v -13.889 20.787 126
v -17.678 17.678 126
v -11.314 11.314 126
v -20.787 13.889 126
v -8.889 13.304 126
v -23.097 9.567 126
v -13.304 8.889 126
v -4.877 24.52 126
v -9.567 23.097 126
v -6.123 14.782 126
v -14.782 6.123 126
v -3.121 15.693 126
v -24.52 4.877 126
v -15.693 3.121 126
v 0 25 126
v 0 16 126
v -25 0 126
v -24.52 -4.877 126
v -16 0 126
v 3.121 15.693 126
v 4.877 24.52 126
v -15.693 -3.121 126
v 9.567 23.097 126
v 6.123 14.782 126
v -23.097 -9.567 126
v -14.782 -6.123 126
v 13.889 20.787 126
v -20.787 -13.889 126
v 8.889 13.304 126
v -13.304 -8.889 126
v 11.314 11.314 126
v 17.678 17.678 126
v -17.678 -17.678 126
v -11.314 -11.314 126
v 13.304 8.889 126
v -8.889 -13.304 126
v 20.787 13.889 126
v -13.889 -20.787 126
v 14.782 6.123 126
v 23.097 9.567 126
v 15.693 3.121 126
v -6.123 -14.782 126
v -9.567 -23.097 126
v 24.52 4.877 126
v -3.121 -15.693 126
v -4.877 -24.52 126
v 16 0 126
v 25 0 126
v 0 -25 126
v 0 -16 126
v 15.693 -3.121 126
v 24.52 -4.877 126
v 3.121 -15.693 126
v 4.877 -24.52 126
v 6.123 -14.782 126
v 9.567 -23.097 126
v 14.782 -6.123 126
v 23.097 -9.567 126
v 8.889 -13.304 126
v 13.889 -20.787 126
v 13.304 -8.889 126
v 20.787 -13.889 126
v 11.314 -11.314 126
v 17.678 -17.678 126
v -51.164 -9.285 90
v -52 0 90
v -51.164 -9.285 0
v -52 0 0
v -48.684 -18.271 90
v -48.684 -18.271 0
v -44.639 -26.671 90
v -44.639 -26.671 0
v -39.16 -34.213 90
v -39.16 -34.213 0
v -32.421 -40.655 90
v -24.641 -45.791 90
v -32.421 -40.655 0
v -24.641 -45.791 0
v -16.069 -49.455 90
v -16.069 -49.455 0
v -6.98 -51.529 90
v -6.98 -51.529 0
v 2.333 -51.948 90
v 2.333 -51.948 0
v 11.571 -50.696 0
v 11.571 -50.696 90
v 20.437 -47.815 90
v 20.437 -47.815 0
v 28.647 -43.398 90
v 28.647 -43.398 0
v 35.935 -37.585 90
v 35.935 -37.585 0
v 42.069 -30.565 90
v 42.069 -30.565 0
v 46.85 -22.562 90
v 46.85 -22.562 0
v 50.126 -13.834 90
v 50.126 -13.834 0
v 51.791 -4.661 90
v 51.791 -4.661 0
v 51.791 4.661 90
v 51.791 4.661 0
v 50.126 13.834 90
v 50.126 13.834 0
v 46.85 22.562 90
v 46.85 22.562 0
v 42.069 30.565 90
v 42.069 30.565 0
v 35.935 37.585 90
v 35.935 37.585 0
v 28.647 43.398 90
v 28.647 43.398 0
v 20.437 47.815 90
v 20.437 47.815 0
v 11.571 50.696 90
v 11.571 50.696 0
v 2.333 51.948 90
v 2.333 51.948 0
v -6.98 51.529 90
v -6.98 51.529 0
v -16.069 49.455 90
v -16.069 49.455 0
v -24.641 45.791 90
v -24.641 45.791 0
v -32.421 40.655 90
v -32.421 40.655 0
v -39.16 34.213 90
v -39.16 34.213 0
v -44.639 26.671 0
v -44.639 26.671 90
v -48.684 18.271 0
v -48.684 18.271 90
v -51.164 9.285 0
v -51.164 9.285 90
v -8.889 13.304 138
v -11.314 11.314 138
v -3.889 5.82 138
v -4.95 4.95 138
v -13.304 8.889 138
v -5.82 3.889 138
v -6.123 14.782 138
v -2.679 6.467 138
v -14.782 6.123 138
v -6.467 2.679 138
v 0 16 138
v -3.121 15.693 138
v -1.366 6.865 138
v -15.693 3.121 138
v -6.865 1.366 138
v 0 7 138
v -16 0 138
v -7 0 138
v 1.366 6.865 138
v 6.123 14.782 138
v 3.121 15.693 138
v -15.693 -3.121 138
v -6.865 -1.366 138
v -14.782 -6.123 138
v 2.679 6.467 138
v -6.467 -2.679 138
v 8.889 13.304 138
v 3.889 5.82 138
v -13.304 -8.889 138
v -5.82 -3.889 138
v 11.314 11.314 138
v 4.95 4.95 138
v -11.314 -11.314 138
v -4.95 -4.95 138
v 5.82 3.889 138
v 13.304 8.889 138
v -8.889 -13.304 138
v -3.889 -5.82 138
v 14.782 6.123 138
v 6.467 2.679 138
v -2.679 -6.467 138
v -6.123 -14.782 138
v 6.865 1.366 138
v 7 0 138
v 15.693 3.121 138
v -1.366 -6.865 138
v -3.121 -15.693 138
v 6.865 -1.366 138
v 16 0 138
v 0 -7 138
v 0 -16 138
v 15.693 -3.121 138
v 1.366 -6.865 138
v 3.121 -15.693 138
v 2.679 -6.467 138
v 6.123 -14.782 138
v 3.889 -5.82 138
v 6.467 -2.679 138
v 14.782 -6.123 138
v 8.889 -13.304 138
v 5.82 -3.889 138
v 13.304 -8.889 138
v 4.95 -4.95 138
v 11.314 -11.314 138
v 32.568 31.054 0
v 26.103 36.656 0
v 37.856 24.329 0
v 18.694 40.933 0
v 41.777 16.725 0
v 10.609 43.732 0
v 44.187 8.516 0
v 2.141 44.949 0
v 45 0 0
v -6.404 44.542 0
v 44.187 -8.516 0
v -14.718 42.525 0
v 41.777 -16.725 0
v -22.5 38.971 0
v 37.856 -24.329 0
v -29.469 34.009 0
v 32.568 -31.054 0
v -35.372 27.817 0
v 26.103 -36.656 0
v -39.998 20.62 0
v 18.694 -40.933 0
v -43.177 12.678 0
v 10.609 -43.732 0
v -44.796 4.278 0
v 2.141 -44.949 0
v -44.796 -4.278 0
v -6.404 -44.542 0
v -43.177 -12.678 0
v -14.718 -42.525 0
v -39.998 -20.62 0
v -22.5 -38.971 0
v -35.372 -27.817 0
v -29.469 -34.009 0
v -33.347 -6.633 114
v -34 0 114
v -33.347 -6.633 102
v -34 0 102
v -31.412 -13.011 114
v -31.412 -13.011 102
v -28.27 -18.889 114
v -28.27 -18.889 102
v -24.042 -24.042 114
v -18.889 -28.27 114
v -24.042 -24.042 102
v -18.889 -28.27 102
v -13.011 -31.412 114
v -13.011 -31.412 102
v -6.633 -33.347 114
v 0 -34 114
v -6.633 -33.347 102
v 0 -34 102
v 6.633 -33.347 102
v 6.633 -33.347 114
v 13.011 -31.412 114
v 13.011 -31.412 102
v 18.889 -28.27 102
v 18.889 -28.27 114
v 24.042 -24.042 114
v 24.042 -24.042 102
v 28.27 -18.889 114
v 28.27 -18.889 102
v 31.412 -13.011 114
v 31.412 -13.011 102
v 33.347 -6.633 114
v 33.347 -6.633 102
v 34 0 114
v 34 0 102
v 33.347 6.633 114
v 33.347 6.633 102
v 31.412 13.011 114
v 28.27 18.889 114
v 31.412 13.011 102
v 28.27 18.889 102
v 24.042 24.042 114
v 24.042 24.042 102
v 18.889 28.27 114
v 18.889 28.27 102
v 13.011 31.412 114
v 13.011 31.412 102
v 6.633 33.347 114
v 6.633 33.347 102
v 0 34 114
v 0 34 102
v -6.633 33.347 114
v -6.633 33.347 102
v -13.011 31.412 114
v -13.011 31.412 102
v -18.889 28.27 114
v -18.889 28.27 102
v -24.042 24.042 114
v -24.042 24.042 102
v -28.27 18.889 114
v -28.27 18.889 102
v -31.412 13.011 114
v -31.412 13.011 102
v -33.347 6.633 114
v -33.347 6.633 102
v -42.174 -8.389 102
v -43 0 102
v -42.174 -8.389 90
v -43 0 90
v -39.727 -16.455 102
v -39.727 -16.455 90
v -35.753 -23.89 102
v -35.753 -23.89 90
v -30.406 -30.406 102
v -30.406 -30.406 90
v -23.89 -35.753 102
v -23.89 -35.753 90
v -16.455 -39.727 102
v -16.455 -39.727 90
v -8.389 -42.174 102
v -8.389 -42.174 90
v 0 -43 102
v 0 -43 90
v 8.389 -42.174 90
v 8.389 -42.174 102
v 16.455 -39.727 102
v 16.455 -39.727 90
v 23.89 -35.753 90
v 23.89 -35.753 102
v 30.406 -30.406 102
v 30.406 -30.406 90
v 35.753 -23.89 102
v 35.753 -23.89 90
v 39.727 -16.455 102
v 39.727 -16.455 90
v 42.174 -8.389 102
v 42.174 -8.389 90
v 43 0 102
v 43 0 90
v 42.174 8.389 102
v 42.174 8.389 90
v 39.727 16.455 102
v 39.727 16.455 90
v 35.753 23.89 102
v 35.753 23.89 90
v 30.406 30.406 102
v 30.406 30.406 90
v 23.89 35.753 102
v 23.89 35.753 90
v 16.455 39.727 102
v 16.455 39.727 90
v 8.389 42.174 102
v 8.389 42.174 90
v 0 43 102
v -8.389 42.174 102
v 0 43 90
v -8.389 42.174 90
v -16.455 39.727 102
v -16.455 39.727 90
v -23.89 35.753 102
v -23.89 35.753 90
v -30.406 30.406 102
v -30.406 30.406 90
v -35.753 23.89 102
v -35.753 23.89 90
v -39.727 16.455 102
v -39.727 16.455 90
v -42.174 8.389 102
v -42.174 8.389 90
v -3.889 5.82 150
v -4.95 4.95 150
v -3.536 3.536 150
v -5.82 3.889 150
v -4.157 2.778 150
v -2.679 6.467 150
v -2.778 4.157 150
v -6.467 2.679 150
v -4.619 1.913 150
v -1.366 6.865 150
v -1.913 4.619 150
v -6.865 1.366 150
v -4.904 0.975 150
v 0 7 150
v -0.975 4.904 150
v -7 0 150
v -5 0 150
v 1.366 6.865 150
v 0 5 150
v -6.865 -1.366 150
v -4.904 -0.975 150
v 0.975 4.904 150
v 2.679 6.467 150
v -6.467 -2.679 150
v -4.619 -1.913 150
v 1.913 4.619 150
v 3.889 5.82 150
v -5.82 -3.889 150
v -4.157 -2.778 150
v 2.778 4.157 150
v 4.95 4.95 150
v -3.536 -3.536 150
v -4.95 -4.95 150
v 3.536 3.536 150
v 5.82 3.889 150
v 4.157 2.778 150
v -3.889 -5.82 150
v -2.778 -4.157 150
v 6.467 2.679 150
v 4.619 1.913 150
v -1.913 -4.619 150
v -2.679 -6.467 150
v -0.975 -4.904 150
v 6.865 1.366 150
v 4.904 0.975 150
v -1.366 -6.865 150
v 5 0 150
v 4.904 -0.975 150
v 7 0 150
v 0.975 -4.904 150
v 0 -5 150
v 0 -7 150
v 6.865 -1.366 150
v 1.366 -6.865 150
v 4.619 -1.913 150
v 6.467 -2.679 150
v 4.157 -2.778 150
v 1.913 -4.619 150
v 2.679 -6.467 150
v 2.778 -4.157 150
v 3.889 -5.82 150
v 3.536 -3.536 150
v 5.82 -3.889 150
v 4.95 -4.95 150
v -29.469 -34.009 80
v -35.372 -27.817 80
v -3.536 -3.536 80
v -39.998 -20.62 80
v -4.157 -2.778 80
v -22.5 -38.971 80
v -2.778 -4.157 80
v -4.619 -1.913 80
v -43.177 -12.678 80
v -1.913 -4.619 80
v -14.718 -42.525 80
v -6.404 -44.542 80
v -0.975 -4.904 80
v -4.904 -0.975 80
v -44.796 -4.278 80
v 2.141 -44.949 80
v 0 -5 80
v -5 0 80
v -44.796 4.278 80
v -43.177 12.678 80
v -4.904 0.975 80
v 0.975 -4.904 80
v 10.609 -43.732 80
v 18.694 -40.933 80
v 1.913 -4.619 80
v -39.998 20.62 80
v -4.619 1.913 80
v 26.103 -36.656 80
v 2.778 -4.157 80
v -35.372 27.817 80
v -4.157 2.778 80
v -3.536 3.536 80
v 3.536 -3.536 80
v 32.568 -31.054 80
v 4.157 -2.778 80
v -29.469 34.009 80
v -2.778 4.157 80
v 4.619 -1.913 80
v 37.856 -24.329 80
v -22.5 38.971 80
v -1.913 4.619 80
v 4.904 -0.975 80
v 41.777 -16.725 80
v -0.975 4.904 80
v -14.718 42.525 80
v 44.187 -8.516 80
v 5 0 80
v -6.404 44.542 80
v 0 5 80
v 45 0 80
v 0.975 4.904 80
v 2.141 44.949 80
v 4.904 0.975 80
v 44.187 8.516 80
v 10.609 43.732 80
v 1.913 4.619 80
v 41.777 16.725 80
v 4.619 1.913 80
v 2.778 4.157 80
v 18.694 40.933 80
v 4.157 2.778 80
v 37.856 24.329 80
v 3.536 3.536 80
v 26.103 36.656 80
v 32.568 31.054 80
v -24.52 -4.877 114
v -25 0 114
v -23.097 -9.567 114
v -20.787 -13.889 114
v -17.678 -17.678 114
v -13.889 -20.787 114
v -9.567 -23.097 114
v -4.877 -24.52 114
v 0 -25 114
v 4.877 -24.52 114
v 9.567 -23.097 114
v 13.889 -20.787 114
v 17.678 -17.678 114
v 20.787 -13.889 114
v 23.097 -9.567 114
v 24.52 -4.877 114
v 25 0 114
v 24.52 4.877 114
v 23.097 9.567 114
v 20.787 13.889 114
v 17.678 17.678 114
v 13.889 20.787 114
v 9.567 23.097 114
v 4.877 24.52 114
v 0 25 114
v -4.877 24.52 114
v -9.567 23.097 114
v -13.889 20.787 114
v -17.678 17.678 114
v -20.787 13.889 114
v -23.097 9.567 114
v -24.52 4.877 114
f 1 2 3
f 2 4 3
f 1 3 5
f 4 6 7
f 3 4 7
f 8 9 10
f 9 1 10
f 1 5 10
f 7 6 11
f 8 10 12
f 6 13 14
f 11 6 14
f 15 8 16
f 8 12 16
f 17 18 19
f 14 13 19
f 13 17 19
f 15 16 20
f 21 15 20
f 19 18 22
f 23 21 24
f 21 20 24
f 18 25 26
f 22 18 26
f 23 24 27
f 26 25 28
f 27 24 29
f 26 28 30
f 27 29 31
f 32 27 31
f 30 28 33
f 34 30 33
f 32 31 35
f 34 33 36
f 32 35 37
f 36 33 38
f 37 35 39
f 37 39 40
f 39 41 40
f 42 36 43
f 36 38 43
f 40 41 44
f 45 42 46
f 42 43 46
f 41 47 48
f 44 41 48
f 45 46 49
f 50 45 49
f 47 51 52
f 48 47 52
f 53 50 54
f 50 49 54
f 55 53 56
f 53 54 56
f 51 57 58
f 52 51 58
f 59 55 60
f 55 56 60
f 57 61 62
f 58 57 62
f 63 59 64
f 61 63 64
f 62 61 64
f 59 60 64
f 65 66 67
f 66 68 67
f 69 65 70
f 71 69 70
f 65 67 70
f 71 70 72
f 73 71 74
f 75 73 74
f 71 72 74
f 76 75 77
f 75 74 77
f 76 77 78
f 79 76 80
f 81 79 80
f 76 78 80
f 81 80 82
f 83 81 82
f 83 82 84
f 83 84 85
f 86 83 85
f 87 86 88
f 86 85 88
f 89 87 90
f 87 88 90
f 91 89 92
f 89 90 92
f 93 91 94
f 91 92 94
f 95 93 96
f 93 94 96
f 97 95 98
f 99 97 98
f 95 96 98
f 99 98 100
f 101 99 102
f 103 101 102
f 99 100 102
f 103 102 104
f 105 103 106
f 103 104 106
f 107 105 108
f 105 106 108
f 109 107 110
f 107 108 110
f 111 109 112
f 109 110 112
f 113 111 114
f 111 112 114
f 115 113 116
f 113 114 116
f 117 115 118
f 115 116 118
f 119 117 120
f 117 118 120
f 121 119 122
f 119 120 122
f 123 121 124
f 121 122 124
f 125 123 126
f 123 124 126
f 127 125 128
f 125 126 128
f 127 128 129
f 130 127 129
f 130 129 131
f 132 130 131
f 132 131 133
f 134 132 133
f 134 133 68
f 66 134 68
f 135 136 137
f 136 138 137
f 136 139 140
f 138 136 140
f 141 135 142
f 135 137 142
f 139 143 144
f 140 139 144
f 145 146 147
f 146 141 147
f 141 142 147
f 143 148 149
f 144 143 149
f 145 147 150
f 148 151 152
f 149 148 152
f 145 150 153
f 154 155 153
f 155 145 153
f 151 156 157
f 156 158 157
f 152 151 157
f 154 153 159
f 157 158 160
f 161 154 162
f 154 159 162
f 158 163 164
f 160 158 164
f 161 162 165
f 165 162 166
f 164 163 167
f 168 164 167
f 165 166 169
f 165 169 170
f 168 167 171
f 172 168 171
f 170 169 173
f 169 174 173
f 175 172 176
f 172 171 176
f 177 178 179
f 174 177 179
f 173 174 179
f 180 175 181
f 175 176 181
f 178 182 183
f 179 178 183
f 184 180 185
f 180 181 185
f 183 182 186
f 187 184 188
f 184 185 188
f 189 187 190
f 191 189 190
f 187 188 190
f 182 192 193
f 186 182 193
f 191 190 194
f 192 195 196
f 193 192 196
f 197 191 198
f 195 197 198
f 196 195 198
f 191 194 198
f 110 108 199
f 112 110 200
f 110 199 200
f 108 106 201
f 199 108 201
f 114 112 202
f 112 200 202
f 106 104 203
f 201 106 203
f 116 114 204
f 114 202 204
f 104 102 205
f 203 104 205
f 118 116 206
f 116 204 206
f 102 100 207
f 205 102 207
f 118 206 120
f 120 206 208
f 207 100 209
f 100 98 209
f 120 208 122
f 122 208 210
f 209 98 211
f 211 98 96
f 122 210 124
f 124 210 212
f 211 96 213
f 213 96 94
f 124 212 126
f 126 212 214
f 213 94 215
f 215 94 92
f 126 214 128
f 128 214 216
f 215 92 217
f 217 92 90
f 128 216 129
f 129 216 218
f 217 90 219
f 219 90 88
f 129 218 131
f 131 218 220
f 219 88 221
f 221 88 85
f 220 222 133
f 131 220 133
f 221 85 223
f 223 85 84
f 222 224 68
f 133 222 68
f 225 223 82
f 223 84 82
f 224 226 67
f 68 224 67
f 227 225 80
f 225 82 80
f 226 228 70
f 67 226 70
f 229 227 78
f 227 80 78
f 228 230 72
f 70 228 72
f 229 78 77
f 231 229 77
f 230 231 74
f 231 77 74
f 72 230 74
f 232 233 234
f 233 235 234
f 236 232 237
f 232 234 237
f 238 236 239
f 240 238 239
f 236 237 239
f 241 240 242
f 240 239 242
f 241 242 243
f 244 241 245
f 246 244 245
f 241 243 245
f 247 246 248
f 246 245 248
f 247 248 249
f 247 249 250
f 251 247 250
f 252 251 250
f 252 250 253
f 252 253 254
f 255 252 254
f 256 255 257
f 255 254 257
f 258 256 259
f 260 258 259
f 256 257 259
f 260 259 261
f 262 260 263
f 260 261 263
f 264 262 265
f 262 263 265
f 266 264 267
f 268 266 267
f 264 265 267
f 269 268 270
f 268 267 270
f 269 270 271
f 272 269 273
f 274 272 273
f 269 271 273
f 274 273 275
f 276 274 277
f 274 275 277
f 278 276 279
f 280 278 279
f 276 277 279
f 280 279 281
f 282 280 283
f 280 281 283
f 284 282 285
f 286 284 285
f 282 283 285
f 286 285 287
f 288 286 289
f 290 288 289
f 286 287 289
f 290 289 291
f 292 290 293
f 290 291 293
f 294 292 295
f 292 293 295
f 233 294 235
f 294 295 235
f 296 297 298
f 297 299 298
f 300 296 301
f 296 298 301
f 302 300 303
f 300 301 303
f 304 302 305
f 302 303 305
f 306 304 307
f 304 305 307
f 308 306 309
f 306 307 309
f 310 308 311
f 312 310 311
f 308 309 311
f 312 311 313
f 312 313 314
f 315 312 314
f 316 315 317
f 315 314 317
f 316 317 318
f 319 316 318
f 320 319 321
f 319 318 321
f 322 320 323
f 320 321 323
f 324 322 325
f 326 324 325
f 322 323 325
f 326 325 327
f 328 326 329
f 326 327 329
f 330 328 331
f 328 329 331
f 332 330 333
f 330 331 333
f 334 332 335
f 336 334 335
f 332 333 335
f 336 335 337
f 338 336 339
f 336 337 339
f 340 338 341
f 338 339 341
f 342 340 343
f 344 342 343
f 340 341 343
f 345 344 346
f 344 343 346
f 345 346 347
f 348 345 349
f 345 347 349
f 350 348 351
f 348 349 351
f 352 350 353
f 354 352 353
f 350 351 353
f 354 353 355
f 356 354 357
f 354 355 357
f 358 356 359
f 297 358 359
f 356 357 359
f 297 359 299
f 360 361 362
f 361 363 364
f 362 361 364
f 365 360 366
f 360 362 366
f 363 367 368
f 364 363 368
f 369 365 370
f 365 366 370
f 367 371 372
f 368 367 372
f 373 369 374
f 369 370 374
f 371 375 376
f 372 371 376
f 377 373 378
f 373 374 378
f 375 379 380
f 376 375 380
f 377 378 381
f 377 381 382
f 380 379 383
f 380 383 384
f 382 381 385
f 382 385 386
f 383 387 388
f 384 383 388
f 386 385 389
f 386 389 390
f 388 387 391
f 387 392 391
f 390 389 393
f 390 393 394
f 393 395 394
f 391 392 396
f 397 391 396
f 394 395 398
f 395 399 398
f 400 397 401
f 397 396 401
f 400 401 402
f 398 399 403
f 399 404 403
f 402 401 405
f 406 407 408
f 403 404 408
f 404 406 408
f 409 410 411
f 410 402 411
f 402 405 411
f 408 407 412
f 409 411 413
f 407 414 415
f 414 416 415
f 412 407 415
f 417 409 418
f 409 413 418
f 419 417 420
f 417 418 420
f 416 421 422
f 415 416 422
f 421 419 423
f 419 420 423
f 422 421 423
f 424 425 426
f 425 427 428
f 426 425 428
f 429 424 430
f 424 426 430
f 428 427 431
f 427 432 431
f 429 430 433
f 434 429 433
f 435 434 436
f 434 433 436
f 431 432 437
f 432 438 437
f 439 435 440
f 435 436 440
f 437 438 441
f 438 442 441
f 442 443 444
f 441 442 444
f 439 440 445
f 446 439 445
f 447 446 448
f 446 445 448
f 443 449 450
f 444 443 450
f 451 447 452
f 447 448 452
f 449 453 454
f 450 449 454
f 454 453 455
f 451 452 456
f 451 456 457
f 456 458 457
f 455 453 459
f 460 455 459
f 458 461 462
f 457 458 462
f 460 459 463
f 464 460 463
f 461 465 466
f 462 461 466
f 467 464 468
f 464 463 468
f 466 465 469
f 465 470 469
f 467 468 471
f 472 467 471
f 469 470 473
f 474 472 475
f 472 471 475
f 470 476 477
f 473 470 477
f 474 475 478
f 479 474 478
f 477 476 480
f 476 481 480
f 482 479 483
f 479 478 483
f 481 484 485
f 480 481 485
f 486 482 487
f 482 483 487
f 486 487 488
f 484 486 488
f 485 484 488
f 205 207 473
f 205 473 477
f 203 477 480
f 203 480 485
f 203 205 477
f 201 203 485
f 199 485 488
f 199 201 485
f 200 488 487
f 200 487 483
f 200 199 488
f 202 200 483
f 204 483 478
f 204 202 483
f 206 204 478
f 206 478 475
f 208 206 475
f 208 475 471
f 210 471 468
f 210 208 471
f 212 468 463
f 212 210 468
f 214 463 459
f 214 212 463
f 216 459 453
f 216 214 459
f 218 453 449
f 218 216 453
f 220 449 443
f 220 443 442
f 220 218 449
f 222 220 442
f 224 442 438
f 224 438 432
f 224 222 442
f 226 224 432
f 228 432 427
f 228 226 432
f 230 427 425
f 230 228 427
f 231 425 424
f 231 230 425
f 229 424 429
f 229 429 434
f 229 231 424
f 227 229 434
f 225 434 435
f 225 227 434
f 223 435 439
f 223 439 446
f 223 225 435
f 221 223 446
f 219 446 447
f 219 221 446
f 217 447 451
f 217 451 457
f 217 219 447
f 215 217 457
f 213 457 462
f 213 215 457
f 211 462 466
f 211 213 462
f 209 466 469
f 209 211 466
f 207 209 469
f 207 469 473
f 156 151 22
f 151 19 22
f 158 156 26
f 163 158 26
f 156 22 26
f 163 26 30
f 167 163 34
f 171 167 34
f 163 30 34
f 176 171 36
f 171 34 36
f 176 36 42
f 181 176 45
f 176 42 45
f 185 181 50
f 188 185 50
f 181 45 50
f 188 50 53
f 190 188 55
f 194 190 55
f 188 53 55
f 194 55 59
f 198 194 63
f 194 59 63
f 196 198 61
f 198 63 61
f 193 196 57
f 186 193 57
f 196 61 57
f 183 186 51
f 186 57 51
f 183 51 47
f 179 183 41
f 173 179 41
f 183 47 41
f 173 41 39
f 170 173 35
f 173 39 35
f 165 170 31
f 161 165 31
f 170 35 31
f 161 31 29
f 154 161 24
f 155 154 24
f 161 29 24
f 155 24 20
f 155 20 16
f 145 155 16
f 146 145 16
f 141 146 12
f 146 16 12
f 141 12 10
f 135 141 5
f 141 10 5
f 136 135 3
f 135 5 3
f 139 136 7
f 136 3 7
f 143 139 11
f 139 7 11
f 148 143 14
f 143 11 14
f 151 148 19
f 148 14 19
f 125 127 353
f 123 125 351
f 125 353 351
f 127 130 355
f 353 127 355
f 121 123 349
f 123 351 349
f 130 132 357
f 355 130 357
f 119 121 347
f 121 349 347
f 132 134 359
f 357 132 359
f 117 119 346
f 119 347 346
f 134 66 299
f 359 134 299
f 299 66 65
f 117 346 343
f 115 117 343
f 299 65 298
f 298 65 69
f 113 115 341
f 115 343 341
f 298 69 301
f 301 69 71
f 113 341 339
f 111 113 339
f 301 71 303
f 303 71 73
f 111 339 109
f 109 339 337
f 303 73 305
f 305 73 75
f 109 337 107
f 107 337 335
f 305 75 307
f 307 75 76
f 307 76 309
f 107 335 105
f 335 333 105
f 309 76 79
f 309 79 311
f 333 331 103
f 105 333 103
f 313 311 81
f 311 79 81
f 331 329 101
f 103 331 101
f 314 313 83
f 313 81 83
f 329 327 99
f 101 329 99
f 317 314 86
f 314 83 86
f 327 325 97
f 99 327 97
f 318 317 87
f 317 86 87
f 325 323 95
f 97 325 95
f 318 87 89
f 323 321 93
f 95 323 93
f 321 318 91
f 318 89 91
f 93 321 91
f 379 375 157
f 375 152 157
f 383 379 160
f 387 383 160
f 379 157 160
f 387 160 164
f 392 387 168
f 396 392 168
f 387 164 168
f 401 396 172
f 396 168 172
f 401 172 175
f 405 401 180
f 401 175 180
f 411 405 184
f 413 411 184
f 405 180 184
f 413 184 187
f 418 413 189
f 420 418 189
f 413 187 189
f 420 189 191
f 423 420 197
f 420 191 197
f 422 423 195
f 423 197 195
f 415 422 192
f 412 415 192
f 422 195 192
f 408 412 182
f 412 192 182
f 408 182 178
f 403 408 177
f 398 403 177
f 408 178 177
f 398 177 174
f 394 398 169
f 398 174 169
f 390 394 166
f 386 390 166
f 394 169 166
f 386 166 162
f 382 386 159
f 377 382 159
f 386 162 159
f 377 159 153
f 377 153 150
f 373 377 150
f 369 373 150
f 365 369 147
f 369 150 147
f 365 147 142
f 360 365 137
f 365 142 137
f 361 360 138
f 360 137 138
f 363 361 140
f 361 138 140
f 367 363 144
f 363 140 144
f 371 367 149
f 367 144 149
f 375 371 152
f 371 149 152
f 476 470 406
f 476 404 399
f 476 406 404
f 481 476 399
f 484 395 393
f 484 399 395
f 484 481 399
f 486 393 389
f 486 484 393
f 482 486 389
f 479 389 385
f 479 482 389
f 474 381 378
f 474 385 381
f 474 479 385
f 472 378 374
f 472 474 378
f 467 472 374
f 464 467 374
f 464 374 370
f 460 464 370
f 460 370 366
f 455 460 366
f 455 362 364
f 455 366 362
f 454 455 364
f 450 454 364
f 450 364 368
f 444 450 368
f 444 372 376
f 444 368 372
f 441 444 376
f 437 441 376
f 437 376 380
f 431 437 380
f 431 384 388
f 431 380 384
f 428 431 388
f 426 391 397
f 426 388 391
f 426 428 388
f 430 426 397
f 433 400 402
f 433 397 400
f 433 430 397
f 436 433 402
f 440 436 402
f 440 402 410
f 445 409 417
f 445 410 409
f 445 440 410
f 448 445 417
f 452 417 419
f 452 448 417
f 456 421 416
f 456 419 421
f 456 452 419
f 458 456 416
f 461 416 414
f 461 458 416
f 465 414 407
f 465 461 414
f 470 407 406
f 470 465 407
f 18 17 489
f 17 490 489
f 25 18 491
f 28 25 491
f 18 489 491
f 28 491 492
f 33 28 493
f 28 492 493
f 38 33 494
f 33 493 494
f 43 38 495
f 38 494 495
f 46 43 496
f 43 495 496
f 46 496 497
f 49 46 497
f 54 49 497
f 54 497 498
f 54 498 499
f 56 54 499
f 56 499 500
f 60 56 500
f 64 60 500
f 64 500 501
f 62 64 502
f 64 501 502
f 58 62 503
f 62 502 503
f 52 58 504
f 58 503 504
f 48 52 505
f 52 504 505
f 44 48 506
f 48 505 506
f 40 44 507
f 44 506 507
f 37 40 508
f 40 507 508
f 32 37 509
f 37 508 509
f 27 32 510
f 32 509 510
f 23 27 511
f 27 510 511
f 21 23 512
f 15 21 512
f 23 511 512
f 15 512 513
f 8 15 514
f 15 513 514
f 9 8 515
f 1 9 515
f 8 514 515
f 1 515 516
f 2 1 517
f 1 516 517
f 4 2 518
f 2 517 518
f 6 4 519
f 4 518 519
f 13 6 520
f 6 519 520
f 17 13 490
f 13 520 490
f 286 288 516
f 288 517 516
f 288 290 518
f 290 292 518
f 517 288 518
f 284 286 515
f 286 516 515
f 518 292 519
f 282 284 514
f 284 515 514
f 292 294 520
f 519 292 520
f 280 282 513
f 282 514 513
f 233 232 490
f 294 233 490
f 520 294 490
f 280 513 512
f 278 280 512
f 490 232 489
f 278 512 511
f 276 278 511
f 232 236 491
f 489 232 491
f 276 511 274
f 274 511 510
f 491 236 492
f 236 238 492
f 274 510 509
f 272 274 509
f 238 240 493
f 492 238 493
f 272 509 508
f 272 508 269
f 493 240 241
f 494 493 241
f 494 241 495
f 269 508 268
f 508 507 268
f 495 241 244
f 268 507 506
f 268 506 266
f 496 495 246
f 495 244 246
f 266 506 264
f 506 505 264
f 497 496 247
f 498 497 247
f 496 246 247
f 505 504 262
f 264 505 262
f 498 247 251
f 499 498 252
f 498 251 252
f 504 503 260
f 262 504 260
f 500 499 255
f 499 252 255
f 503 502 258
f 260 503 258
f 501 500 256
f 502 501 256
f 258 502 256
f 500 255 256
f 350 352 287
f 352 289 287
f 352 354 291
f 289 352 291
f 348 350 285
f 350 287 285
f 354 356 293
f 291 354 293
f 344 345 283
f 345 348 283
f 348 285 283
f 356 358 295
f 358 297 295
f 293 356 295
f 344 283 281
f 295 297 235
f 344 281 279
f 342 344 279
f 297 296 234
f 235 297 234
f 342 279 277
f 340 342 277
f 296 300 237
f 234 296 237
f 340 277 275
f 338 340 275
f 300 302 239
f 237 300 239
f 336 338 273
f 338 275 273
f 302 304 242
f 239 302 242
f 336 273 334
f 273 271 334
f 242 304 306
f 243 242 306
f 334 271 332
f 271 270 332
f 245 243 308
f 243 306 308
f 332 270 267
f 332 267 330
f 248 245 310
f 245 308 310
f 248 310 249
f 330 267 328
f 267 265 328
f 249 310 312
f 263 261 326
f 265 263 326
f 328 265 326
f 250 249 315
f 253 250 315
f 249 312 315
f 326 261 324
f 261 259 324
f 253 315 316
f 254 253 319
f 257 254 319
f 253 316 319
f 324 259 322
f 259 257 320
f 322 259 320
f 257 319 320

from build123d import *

# Parameters (mm, degrees)
F2_R     = 45
F3_DEPTH = 80
F4_R     = 5
F5_DEPTH = 150.001


with BuildPart() as f1:
    # F0 (on Front) → F1 (revolve)
    with BuildSketch(Plane.XZ):
        Polygon((-52, 0), (0, 0), (0, 150), (-2, 150), (-7, 150), (-7, 138), (-16, 138), (-16, 126), (-25, 126), (-25, 114), (-34, 114), (-34, 102), (-43, 102), (-43, 90), (-52, 90), align=None)
    revolve(axis=Axis((0, 0, 75), (0, 0, 1)))

    # F2 (on Top) → F3 (cut)
    with BuildSketch(Plane.XY):
        Circle(F2_R)
    extrude(amount=F3_DEPTH, mode=Mode.SUBTRACT)

    # F4 (on Top) → F5 (cut, through all)
    with BuildSketch(Plane.XY):
        Circle(F4_R)
    extrude(amount=F5_DEPTH, mode=Mode.SUBTRACT)


solid = f1.part
